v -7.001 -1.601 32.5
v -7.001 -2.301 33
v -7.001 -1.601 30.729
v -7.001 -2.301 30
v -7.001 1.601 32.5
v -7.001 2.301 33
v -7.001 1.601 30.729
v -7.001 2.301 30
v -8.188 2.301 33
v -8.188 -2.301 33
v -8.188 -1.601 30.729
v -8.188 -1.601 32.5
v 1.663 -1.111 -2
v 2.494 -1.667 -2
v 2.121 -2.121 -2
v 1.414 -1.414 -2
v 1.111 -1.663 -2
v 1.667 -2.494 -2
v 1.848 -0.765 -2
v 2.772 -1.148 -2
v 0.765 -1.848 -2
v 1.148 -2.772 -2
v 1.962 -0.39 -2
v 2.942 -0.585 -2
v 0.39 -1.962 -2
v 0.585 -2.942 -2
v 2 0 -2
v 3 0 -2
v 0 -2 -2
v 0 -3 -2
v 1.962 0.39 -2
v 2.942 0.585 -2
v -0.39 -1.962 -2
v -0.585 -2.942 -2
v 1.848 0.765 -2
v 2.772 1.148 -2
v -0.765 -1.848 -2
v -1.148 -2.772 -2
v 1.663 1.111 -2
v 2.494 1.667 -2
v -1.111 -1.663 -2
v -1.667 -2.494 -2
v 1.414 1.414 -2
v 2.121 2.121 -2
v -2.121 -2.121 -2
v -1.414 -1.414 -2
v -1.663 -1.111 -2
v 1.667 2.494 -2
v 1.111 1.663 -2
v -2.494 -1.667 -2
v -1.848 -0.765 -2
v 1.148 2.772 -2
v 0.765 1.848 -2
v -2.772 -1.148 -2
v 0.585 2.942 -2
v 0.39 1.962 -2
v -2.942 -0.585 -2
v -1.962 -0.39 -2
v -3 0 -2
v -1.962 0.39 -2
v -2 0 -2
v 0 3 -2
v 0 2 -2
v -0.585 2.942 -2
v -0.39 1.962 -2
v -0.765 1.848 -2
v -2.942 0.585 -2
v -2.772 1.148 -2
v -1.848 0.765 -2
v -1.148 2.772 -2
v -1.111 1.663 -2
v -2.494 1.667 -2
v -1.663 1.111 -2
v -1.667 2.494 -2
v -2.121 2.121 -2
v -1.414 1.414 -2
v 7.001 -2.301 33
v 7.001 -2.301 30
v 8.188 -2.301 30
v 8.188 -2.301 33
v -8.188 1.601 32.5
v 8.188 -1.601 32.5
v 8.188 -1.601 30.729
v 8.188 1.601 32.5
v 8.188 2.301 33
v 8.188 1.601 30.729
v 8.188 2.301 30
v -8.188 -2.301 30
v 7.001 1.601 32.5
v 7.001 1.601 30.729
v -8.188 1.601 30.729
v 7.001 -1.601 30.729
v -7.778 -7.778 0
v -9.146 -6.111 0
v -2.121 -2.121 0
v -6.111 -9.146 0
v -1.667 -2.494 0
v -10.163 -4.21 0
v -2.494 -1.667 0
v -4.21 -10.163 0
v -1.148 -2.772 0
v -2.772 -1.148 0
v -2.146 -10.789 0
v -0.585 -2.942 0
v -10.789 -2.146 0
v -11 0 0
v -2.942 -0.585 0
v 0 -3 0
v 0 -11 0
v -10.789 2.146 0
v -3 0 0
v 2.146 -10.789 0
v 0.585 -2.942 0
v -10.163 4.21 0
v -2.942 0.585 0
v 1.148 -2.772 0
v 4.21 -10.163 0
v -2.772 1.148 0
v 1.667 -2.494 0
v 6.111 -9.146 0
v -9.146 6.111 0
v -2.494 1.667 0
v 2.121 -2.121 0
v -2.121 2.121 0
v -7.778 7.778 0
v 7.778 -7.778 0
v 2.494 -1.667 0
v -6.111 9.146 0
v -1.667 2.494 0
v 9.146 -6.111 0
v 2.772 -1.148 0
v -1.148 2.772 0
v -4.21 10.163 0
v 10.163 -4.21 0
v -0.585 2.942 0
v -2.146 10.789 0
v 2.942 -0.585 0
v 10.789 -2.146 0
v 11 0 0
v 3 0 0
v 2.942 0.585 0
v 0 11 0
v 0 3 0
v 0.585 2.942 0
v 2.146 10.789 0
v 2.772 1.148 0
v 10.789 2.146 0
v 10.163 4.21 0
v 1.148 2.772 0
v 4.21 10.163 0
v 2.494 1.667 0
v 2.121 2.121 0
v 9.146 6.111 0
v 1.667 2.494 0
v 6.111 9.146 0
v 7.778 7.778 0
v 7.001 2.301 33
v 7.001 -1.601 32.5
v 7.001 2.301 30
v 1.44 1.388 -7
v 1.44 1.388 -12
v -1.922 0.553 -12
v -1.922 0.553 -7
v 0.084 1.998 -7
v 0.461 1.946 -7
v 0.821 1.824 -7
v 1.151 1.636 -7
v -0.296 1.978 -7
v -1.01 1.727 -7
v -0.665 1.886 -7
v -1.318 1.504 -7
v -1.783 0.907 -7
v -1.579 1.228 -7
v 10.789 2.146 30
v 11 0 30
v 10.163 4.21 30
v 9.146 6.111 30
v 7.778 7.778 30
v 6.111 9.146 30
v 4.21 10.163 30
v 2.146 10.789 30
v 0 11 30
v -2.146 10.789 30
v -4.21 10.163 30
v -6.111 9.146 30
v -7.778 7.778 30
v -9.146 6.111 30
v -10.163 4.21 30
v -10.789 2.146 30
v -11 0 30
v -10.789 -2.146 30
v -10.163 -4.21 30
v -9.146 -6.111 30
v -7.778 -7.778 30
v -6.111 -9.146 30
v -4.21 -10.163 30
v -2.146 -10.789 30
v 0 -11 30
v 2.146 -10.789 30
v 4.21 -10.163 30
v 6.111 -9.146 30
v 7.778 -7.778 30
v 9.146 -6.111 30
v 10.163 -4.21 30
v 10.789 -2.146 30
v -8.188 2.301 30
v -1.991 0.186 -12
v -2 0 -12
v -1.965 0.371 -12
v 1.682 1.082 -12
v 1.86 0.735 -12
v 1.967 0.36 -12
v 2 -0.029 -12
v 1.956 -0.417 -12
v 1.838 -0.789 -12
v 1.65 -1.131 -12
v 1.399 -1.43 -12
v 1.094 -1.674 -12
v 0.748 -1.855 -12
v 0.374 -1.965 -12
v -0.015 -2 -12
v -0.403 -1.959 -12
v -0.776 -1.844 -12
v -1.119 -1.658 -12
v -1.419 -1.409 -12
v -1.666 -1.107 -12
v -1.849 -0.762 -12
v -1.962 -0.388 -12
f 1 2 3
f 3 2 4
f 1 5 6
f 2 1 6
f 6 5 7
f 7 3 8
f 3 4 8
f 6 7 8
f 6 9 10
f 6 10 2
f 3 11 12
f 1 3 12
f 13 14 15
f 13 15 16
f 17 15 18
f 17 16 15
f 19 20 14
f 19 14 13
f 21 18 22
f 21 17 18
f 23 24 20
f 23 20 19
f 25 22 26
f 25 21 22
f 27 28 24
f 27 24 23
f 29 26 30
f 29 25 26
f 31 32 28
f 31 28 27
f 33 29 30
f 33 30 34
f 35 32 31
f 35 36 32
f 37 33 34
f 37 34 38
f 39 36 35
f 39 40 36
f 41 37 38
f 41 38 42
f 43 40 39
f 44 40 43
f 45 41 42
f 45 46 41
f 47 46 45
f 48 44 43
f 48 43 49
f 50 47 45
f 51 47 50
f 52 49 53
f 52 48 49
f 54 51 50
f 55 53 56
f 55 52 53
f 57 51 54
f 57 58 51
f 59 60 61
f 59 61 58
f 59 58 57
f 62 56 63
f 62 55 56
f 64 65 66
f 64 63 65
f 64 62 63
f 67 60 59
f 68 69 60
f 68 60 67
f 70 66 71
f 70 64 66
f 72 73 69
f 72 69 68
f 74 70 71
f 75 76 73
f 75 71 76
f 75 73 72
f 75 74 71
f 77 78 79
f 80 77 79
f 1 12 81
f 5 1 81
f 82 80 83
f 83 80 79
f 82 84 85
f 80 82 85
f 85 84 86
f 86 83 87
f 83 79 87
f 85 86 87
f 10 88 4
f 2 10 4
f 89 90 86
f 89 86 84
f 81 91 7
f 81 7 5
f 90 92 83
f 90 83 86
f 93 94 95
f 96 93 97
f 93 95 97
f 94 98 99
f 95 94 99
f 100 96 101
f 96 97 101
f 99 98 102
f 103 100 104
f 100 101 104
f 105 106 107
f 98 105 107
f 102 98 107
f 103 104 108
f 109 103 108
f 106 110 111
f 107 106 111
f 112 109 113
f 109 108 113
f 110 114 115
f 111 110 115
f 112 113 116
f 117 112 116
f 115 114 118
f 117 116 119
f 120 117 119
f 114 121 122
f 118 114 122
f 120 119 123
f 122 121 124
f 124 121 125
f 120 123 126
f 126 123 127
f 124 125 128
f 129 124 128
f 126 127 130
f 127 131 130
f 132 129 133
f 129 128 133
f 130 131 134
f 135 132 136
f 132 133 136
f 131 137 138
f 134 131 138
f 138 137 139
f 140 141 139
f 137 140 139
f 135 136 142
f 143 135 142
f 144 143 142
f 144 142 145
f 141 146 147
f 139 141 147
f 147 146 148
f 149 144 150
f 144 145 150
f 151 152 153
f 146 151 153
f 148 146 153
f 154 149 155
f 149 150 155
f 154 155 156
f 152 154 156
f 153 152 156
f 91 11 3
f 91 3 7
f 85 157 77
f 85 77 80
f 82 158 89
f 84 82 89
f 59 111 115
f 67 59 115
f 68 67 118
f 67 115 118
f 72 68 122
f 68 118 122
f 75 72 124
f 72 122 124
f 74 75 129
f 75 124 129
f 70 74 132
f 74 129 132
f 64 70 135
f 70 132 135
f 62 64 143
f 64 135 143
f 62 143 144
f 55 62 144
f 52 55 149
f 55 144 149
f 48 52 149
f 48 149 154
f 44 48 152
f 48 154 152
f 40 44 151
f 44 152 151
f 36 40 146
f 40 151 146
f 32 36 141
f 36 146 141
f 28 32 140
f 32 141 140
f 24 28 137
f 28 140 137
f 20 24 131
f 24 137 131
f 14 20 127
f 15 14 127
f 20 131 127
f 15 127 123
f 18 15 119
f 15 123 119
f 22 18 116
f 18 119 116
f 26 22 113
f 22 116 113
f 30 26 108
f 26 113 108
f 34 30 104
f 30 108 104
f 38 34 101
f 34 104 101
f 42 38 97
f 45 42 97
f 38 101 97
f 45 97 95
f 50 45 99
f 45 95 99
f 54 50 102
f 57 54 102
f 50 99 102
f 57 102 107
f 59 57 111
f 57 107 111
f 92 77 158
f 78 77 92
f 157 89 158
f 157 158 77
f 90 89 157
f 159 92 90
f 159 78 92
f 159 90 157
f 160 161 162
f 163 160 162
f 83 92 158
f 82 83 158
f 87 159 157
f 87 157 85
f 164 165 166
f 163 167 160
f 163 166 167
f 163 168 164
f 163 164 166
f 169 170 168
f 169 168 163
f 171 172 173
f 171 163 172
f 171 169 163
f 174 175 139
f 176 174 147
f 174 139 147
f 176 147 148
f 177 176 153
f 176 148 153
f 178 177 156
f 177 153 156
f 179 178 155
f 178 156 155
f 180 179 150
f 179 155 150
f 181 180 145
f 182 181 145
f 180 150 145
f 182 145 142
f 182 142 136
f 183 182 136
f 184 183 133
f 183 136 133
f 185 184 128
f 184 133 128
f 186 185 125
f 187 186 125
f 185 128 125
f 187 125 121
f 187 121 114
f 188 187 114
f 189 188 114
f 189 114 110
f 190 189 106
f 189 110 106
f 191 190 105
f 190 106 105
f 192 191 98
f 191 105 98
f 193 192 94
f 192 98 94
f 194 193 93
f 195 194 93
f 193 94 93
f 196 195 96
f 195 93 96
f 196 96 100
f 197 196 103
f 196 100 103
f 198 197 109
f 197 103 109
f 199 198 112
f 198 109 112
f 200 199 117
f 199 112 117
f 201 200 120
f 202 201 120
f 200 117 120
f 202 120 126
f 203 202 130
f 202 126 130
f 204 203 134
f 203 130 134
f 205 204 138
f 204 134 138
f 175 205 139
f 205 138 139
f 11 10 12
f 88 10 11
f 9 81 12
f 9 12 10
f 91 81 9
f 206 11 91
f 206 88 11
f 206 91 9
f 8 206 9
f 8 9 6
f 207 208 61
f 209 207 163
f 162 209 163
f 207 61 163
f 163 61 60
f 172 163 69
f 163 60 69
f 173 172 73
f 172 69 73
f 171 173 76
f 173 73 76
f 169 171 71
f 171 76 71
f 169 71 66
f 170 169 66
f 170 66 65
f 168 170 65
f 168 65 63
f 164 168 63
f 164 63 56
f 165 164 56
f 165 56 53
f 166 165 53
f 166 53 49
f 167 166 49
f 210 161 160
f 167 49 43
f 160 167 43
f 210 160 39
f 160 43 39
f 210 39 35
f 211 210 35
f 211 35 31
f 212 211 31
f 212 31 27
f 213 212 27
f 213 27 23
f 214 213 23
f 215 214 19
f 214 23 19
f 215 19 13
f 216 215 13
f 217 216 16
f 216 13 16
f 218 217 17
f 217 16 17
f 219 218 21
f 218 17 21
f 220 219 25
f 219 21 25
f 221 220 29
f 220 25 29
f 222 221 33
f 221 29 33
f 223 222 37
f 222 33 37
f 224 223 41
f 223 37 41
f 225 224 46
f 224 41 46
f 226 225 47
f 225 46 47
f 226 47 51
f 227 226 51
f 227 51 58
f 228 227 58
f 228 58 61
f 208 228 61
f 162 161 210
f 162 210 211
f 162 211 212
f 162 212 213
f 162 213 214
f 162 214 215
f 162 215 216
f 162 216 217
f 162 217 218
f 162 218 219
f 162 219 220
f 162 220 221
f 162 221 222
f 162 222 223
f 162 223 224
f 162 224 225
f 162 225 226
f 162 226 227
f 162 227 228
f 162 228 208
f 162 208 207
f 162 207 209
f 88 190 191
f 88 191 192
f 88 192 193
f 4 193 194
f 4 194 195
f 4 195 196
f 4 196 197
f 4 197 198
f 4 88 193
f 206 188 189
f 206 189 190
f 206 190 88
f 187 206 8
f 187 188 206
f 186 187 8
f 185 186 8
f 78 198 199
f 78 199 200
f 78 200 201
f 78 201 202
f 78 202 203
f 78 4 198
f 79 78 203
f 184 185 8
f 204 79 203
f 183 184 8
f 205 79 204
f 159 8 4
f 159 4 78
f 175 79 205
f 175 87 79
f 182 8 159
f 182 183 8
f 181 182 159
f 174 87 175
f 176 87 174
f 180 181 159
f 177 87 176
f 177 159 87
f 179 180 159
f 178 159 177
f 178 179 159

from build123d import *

# Parameters (mm, degrees)
SKETCH1_R           = 11
BOSS_EXTRUDE1_DEPTH = 30
SKETCH2_R           = 3
BOSS_EXTRUDE2_DEPTH = 2
SKETCH3_R           = 2
BOSS_EXTRUDE3_DEPTH = 10
SKETCH4_W           = 1.187251635
SKETCH4_H           = 4.601713706
BOSS_EXTRUDE4_DEPTH = 3
SKETCH5_W           = 1.771317087
SKETCH5_H           = 3.201713706
CUT_EXTRUDE1_DEPTH  = 40.726440378
CUT_EXTRUDE2_DEPTH  = 5


with BuildPart() as part:
    # Sketch1 → Boss-Extrude1 (new body)
    with BuildSketch(Plane.XY):
        Circle(SKETCH1_R)
    extrude(amount=BOSS_EXTRUDE1_DEPTH)

    # Sketch2 → Boss-Extrude2 (add)
    with BuildSketch(Plane(origin=(0, 0, 0), x_dir=(-1, 0, 0), z_dir=(0, 0, -1))):
        Circle(SKETCH2_R)
    extrude(amount=BOSS_EXTRUDE2_DEPTH)

    # Sketch3 → Boss-Extrude3 (add)
    with BuildSketch(Plane(origin=(0, 0, -2), x_dir=(-1, 0, 0), z_dir=(0, 0, -1))):
        Circle(SKETCH3_R)
    extrude(amount=BOSS_EXTRUDE3_DEPTH)

    # Sketch4 → Boss-Extrude4 (add)
    with BuildSketch(Plane.XY.offset(30)):
        with Locations((-7.594653551, 0)):
            Rectangle(SKETCH4_W, SKETCH4_H)
        with Locations((7.594653551, 0)):
            Rectangle(SKETCH4_W, SKETCH4_H)
    extrude(amount=BOSS_EXTRUDE4_DEPTH)

    # Sketch5 → Cut-Extrude1 (cut, through all)
    with BuildSketch(Plane.ZY.offset(8.188279368)):
        with Locations((31.614341457, 0)):
            Rectangle(SKETCH5_W, SKETCH5_H)
    extrude(amount=-CUT_EXTRUDE1_DEPTH, mode=Mode.SUBTRACT)

    # Sketch6 → Cut-Extrude2 (cut)
    with BuildSketch(Plane(origin=(0, 0, -12), x_dir=(-1, 0, 0), z_dir=(0, 0, -1))):
        Polygon((-45.221186331, 12.264551338), (-1.439858088, 1.388095345), (1.922054875, 0.55290601), (45.703383118, -10.323549984), (67.456295106, 77.239106502), (-23.468274343, 99.827207824), align=None)
    extrude(amount=-CUT_EXTRUDE2_DEPTH, mode=Mode.SUBTRACT)


solid = part.part
